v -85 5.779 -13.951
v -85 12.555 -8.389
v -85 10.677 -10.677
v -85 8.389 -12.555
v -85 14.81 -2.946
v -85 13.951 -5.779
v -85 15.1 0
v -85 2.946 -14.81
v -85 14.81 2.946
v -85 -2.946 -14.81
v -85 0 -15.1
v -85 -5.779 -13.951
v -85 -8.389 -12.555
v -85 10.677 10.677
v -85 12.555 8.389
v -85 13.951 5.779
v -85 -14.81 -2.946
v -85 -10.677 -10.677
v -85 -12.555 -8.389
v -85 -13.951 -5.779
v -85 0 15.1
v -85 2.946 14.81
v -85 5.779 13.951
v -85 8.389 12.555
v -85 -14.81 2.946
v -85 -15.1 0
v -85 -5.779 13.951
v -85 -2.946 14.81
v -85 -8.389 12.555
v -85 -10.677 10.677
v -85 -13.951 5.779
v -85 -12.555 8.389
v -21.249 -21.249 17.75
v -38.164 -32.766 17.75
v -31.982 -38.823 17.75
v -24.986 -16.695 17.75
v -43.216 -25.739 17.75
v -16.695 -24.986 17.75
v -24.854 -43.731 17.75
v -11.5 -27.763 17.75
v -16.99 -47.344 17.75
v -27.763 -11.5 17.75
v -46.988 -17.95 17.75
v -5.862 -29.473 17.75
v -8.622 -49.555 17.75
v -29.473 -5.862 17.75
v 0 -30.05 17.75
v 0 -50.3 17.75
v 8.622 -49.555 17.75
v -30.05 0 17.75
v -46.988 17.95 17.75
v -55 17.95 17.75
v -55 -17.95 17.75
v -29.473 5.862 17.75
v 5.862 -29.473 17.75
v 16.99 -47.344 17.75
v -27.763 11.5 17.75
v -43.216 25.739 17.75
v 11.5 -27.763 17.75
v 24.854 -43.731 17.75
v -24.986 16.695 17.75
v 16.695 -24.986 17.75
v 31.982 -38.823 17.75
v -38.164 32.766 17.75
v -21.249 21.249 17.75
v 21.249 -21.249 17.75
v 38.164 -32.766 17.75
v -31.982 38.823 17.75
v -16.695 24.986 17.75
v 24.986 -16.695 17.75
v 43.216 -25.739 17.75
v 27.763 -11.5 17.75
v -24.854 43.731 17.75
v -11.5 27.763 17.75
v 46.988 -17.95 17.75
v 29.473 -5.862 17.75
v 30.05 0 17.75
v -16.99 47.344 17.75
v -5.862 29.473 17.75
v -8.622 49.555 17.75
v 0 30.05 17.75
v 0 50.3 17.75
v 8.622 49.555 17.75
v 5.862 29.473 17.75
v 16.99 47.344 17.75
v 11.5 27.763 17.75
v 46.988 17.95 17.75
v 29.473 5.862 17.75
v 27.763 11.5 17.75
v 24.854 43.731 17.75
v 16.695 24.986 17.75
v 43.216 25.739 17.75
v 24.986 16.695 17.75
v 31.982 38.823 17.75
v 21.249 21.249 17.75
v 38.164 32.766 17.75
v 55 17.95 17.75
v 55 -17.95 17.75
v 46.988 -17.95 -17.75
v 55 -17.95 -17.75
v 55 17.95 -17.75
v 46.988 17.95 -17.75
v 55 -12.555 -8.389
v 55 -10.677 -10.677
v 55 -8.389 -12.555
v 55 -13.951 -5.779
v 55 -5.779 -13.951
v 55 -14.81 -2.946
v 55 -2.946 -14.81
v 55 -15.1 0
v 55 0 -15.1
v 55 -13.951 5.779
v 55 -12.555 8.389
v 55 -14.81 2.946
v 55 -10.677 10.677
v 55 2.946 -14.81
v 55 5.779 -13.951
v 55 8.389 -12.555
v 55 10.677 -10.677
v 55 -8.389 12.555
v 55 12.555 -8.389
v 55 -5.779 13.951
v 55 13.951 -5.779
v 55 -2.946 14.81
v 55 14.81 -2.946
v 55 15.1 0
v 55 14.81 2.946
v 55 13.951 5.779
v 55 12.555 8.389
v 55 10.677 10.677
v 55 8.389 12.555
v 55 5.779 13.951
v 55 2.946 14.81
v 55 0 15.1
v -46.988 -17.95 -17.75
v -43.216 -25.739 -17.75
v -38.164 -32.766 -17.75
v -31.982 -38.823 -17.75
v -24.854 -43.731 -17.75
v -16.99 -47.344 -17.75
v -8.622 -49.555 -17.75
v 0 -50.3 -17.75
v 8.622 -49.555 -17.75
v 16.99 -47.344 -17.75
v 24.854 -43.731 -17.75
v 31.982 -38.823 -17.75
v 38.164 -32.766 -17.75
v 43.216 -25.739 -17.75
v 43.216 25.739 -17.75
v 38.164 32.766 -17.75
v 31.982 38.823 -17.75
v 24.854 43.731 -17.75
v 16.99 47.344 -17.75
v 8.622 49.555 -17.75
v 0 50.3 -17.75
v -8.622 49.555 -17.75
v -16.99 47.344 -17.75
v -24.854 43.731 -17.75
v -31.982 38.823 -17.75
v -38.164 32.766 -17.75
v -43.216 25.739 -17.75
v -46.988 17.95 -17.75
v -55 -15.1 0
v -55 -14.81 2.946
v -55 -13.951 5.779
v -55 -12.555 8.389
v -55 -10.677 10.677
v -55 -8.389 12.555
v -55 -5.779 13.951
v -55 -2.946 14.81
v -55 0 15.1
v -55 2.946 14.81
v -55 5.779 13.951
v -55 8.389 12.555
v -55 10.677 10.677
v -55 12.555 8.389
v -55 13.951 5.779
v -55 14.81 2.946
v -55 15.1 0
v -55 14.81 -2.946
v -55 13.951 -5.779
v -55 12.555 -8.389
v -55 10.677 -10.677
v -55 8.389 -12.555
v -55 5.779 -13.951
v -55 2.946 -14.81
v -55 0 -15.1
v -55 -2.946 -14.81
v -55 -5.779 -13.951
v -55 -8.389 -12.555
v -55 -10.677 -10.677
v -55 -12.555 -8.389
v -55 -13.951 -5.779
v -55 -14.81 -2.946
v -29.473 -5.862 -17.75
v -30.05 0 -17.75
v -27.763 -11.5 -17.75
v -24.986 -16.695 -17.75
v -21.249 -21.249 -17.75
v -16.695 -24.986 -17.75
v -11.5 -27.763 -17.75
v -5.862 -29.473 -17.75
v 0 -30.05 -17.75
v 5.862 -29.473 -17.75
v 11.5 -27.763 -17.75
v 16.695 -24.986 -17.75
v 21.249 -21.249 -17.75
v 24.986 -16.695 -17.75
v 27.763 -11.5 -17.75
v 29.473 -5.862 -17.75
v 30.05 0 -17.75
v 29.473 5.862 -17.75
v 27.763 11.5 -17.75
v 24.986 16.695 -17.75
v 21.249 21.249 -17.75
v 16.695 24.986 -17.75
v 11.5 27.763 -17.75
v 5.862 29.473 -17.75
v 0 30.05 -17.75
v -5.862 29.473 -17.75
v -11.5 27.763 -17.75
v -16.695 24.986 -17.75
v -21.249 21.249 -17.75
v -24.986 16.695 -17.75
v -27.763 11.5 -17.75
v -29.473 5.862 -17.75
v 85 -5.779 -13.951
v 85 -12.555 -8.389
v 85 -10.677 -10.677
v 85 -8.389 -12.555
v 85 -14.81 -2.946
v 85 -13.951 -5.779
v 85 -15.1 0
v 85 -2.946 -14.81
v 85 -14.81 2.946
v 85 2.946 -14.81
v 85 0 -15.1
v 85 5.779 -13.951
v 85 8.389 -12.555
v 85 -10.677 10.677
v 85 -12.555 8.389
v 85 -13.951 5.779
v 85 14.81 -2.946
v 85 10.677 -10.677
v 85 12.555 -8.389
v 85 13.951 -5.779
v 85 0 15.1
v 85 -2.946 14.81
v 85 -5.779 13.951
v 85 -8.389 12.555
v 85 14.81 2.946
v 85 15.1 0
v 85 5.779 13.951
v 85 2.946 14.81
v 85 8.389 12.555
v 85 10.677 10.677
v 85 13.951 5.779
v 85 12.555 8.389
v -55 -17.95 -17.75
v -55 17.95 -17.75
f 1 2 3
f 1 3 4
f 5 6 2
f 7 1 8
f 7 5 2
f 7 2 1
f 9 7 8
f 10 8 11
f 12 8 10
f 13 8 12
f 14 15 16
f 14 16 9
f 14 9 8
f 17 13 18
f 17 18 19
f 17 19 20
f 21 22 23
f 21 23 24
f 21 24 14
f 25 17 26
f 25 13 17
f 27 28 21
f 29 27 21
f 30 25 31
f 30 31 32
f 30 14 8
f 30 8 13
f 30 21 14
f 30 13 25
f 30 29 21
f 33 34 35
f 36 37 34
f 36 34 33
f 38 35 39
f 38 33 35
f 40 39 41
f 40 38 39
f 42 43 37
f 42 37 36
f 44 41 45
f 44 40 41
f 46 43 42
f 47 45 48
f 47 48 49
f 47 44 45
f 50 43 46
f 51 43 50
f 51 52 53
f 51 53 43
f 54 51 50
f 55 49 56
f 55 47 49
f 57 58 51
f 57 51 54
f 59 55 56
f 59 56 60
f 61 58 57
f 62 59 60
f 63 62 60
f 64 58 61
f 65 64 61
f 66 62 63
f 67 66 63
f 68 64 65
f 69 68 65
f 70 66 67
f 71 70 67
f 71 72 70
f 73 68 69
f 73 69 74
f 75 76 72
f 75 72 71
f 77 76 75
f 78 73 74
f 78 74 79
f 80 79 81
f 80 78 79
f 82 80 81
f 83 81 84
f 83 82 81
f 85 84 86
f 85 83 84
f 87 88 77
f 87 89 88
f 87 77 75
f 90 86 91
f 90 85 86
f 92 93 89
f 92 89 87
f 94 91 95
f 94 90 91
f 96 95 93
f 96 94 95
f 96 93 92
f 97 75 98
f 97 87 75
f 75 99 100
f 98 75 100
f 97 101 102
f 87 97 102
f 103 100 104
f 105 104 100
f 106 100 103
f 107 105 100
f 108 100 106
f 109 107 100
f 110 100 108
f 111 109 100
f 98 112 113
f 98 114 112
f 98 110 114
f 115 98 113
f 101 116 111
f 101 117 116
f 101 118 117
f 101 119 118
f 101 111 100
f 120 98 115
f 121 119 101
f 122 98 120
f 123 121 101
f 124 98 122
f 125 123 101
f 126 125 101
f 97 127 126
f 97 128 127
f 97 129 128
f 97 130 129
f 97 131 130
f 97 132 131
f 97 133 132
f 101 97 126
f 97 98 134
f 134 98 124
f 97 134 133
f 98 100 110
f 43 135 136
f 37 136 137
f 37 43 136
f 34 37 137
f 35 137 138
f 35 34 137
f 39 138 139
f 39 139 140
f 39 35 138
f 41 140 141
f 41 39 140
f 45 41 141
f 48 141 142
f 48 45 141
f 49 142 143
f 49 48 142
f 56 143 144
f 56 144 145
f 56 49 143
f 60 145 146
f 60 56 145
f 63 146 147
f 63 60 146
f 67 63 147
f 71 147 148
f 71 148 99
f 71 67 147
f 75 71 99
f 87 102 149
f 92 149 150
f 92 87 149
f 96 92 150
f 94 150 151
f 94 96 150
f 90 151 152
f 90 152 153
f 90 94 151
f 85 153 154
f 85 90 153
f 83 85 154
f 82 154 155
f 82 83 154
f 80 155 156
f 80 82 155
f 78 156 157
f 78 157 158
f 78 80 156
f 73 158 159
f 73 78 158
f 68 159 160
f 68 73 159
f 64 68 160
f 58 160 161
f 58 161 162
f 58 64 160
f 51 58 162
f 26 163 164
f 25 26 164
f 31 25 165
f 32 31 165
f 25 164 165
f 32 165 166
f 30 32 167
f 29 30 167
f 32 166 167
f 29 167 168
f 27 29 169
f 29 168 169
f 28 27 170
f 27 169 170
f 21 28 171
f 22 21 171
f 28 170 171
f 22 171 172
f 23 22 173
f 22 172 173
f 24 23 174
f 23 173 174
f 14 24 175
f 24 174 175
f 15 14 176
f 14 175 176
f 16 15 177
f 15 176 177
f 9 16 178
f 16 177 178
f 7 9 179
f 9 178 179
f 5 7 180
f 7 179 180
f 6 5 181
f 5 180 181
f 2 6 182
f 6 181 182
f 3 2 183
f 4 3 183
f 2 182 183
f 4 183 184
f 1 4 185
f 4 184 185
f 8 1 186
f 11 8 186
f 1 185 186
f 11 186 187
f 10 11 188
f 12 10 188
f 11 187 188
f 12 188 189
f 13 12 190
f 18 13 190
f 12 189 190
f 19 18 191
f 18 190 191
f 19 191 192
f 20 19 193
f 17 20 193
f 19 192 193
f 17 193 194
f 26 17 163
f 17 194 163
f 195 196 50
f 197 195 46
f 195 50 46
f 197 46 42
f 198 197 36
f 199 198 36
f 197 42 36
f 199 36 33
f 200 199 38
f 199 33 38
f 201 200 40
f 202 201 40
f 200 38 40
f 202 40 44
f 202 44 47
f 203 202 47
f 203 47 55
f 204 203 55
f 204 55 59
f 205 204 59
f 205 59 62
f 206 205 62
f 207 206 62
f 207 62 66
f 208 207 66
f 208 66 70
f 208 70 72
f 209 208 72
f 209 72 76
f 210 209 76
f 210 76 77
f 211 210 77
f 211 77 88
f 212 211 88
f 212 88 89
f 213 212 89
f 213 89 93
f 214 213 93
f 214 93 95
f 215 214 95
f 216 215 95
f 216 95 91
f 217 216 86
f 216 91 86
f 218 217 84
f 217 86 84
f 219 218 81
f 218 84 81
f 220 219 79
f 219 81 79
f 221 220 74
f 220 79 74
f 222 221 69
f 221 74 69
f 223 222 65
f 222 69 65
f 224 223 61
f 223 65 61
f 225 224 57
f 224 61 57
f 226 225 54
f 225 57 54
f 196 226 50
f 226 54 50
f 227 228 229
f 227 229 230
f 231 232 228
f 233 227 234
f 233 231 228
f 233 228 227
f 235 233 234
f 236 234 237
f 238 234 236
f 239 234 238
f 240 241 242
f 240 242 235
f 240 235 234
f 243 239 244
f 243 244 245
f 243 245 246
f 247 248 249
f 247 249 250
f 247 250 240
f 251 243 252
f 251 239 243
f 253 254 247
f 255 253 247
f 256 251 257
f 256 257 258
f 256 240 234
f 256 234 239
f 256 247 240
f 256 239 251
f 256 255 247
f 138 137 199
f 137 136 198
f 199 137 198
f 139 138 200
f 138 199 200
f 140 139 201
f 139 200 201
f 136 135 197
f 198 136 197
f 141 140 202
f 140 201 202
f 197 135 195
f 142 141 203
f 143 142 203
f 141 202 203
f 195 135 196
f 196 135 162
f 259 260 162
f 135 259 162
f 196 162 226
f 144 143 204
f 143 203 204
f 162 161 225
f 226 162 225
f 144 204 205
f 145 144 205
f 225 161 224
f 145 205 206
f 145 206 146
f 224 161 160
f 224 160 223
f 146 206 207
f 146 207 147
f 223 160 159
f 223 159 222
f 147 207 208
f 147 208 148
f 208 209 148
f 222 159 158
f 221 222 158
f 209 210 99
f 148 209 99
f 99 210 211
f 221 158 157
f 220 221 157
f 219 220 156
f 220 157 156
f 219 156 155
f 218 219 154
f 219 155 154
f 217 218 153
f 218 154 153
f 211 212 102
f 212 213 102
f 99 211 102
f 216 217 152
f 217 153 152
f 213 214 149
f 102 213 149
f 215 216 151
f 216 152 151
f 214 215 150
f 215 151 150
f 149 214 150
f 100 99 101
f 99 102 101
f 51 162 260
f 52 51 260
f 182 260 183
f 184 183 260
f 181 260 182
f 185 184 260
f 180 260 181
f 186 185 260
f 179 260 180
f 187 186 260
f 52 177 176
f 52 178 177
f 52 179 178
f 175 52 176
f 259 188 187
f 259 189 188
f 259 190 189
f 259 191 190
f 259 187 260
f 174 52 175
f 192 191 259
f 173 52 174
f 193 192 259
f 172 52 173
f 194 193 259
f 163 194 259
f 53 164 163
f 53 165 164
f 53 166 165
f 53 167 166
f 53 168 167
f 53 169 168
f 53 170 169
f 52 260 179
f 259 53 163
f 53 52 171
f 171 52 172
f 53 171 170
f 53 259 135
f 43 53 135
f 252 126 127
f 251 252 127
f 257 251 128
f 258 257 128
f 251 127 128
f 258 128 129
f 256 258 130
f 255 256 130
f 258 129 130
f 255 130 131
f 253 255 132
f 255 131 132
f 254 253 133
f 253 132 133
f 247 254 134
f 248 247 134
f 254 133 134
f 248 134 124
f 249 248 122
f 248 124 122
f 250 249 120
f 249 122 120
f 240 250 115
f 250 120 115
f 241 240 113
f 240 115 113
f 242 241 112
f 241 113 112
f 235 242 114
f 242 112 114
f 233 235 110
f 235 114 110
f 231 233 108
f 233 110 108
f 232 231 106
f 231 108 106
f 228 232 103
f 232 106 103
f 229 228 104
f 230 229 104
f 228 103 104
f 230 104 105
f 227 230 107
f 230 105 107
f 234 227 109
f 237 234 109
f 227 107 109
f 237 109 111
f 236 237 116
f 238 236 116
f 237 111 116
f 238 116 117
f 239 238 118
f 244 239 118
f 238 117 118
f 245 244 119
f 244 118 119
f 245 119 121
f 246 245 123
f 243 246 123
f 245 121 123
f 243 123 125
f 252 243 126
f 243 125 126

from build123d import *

# Parameters (mm, degrees)
F1_DEPTH = 17.75
F3_R     = 15.1
F4_DEPTH = 30
F6_R     = 15.1
F7_DEPTH = 30
F10_D    = 60.1


with BuildPart() as f1:
    # F0 (on Top) → F1 (new body, symmetric)
    with BuildSketch(Plane.XY):
        with BuildLine():
            ThreePointArc((46.9881634031, -17.95), (49.4651120446, -9.1264829157), (50.3, 0))
            ThreePointArc((50.3, 0), (49.4651120446, 9.1264829157), (46.9881634031, 17.95))
            Line((46.9881634031, 17.95), (-46.9881634031, 17.95))
            ThreePointArc((-46.9881634031, 17.95), (-50.3, 0), (-46.9881634031, -17.95))
            Line((-46.9881634031, -17.95), (46.9881634031, -17.95))
        make_face()
        with BuildLine():
            Line((-46.9881634031, 17.95), (46.9881634031, 17.95))
            ThreePointArc((46.9881634031, 17.95), (0, 50.3), (-46.9881634031, 17.95))
        make_face()
        with BuildLine():
            ThreePointArc((46.9881634031, 17.95), (49.4651120446, 9.1264829157), (50.3, 0))
            ThreePointArc((50.3, 0), (49.4651120446, -9.1264829157), (46.9881634031, -17.95))
            Line((46.9881634031, -17.95), (55, -17.95))
            Line((55, -17.95), (55, 17.95))
            Line((55, 17.95), (46.9881634031, 17.95))
        make_face()
        with BuildLine():
            ThreePointArc((-46.9881634031, -17.95), (0, -50.3), (46.9881634031, -17.95))
            Line((46.9881634031, -17.95), (-46.9881634031, -17.95))
        make_face()
        with BuildLine():
            ThreePointArc((-46.9881634031, -17.95), (-50.3, 0), (-46.9881634031, 17.95))
            Line((-46.9881634031, 17.95), (-55, 17.95))
            Line((-55, 17.95), (-55, -17.95))
            Line((-55, -17.95), (-46.9881634031, -17.95))
        make_face()
    extrude(amount=F1_DEPTH, both=True)

    # F3 (on offset) → F4 (join)
    with BuildSketch(Plane.YZ.offset(55)):
        Circle(F3_R)
    extrude(amount=F4_DEPTH)

    # F6 (on offset) → F7 (join)
    with BuildSketch(Plane(origin=(-55, 0, 0), x_dir=(0, -1, 0), z_dir=(-1, 0, 0))):
        Circle(F6_R)
    extrude(amount=F7_DEPTH)

    # F10 (through all)
    with Locations(Plane(origin=(0, 0, -17.75), x_dir=(1, 0, 0), z_dir=(0, 0, -1))):
        with Locations((0, 0)):
            Hole(F10_D / 2)


solid = f1.part
